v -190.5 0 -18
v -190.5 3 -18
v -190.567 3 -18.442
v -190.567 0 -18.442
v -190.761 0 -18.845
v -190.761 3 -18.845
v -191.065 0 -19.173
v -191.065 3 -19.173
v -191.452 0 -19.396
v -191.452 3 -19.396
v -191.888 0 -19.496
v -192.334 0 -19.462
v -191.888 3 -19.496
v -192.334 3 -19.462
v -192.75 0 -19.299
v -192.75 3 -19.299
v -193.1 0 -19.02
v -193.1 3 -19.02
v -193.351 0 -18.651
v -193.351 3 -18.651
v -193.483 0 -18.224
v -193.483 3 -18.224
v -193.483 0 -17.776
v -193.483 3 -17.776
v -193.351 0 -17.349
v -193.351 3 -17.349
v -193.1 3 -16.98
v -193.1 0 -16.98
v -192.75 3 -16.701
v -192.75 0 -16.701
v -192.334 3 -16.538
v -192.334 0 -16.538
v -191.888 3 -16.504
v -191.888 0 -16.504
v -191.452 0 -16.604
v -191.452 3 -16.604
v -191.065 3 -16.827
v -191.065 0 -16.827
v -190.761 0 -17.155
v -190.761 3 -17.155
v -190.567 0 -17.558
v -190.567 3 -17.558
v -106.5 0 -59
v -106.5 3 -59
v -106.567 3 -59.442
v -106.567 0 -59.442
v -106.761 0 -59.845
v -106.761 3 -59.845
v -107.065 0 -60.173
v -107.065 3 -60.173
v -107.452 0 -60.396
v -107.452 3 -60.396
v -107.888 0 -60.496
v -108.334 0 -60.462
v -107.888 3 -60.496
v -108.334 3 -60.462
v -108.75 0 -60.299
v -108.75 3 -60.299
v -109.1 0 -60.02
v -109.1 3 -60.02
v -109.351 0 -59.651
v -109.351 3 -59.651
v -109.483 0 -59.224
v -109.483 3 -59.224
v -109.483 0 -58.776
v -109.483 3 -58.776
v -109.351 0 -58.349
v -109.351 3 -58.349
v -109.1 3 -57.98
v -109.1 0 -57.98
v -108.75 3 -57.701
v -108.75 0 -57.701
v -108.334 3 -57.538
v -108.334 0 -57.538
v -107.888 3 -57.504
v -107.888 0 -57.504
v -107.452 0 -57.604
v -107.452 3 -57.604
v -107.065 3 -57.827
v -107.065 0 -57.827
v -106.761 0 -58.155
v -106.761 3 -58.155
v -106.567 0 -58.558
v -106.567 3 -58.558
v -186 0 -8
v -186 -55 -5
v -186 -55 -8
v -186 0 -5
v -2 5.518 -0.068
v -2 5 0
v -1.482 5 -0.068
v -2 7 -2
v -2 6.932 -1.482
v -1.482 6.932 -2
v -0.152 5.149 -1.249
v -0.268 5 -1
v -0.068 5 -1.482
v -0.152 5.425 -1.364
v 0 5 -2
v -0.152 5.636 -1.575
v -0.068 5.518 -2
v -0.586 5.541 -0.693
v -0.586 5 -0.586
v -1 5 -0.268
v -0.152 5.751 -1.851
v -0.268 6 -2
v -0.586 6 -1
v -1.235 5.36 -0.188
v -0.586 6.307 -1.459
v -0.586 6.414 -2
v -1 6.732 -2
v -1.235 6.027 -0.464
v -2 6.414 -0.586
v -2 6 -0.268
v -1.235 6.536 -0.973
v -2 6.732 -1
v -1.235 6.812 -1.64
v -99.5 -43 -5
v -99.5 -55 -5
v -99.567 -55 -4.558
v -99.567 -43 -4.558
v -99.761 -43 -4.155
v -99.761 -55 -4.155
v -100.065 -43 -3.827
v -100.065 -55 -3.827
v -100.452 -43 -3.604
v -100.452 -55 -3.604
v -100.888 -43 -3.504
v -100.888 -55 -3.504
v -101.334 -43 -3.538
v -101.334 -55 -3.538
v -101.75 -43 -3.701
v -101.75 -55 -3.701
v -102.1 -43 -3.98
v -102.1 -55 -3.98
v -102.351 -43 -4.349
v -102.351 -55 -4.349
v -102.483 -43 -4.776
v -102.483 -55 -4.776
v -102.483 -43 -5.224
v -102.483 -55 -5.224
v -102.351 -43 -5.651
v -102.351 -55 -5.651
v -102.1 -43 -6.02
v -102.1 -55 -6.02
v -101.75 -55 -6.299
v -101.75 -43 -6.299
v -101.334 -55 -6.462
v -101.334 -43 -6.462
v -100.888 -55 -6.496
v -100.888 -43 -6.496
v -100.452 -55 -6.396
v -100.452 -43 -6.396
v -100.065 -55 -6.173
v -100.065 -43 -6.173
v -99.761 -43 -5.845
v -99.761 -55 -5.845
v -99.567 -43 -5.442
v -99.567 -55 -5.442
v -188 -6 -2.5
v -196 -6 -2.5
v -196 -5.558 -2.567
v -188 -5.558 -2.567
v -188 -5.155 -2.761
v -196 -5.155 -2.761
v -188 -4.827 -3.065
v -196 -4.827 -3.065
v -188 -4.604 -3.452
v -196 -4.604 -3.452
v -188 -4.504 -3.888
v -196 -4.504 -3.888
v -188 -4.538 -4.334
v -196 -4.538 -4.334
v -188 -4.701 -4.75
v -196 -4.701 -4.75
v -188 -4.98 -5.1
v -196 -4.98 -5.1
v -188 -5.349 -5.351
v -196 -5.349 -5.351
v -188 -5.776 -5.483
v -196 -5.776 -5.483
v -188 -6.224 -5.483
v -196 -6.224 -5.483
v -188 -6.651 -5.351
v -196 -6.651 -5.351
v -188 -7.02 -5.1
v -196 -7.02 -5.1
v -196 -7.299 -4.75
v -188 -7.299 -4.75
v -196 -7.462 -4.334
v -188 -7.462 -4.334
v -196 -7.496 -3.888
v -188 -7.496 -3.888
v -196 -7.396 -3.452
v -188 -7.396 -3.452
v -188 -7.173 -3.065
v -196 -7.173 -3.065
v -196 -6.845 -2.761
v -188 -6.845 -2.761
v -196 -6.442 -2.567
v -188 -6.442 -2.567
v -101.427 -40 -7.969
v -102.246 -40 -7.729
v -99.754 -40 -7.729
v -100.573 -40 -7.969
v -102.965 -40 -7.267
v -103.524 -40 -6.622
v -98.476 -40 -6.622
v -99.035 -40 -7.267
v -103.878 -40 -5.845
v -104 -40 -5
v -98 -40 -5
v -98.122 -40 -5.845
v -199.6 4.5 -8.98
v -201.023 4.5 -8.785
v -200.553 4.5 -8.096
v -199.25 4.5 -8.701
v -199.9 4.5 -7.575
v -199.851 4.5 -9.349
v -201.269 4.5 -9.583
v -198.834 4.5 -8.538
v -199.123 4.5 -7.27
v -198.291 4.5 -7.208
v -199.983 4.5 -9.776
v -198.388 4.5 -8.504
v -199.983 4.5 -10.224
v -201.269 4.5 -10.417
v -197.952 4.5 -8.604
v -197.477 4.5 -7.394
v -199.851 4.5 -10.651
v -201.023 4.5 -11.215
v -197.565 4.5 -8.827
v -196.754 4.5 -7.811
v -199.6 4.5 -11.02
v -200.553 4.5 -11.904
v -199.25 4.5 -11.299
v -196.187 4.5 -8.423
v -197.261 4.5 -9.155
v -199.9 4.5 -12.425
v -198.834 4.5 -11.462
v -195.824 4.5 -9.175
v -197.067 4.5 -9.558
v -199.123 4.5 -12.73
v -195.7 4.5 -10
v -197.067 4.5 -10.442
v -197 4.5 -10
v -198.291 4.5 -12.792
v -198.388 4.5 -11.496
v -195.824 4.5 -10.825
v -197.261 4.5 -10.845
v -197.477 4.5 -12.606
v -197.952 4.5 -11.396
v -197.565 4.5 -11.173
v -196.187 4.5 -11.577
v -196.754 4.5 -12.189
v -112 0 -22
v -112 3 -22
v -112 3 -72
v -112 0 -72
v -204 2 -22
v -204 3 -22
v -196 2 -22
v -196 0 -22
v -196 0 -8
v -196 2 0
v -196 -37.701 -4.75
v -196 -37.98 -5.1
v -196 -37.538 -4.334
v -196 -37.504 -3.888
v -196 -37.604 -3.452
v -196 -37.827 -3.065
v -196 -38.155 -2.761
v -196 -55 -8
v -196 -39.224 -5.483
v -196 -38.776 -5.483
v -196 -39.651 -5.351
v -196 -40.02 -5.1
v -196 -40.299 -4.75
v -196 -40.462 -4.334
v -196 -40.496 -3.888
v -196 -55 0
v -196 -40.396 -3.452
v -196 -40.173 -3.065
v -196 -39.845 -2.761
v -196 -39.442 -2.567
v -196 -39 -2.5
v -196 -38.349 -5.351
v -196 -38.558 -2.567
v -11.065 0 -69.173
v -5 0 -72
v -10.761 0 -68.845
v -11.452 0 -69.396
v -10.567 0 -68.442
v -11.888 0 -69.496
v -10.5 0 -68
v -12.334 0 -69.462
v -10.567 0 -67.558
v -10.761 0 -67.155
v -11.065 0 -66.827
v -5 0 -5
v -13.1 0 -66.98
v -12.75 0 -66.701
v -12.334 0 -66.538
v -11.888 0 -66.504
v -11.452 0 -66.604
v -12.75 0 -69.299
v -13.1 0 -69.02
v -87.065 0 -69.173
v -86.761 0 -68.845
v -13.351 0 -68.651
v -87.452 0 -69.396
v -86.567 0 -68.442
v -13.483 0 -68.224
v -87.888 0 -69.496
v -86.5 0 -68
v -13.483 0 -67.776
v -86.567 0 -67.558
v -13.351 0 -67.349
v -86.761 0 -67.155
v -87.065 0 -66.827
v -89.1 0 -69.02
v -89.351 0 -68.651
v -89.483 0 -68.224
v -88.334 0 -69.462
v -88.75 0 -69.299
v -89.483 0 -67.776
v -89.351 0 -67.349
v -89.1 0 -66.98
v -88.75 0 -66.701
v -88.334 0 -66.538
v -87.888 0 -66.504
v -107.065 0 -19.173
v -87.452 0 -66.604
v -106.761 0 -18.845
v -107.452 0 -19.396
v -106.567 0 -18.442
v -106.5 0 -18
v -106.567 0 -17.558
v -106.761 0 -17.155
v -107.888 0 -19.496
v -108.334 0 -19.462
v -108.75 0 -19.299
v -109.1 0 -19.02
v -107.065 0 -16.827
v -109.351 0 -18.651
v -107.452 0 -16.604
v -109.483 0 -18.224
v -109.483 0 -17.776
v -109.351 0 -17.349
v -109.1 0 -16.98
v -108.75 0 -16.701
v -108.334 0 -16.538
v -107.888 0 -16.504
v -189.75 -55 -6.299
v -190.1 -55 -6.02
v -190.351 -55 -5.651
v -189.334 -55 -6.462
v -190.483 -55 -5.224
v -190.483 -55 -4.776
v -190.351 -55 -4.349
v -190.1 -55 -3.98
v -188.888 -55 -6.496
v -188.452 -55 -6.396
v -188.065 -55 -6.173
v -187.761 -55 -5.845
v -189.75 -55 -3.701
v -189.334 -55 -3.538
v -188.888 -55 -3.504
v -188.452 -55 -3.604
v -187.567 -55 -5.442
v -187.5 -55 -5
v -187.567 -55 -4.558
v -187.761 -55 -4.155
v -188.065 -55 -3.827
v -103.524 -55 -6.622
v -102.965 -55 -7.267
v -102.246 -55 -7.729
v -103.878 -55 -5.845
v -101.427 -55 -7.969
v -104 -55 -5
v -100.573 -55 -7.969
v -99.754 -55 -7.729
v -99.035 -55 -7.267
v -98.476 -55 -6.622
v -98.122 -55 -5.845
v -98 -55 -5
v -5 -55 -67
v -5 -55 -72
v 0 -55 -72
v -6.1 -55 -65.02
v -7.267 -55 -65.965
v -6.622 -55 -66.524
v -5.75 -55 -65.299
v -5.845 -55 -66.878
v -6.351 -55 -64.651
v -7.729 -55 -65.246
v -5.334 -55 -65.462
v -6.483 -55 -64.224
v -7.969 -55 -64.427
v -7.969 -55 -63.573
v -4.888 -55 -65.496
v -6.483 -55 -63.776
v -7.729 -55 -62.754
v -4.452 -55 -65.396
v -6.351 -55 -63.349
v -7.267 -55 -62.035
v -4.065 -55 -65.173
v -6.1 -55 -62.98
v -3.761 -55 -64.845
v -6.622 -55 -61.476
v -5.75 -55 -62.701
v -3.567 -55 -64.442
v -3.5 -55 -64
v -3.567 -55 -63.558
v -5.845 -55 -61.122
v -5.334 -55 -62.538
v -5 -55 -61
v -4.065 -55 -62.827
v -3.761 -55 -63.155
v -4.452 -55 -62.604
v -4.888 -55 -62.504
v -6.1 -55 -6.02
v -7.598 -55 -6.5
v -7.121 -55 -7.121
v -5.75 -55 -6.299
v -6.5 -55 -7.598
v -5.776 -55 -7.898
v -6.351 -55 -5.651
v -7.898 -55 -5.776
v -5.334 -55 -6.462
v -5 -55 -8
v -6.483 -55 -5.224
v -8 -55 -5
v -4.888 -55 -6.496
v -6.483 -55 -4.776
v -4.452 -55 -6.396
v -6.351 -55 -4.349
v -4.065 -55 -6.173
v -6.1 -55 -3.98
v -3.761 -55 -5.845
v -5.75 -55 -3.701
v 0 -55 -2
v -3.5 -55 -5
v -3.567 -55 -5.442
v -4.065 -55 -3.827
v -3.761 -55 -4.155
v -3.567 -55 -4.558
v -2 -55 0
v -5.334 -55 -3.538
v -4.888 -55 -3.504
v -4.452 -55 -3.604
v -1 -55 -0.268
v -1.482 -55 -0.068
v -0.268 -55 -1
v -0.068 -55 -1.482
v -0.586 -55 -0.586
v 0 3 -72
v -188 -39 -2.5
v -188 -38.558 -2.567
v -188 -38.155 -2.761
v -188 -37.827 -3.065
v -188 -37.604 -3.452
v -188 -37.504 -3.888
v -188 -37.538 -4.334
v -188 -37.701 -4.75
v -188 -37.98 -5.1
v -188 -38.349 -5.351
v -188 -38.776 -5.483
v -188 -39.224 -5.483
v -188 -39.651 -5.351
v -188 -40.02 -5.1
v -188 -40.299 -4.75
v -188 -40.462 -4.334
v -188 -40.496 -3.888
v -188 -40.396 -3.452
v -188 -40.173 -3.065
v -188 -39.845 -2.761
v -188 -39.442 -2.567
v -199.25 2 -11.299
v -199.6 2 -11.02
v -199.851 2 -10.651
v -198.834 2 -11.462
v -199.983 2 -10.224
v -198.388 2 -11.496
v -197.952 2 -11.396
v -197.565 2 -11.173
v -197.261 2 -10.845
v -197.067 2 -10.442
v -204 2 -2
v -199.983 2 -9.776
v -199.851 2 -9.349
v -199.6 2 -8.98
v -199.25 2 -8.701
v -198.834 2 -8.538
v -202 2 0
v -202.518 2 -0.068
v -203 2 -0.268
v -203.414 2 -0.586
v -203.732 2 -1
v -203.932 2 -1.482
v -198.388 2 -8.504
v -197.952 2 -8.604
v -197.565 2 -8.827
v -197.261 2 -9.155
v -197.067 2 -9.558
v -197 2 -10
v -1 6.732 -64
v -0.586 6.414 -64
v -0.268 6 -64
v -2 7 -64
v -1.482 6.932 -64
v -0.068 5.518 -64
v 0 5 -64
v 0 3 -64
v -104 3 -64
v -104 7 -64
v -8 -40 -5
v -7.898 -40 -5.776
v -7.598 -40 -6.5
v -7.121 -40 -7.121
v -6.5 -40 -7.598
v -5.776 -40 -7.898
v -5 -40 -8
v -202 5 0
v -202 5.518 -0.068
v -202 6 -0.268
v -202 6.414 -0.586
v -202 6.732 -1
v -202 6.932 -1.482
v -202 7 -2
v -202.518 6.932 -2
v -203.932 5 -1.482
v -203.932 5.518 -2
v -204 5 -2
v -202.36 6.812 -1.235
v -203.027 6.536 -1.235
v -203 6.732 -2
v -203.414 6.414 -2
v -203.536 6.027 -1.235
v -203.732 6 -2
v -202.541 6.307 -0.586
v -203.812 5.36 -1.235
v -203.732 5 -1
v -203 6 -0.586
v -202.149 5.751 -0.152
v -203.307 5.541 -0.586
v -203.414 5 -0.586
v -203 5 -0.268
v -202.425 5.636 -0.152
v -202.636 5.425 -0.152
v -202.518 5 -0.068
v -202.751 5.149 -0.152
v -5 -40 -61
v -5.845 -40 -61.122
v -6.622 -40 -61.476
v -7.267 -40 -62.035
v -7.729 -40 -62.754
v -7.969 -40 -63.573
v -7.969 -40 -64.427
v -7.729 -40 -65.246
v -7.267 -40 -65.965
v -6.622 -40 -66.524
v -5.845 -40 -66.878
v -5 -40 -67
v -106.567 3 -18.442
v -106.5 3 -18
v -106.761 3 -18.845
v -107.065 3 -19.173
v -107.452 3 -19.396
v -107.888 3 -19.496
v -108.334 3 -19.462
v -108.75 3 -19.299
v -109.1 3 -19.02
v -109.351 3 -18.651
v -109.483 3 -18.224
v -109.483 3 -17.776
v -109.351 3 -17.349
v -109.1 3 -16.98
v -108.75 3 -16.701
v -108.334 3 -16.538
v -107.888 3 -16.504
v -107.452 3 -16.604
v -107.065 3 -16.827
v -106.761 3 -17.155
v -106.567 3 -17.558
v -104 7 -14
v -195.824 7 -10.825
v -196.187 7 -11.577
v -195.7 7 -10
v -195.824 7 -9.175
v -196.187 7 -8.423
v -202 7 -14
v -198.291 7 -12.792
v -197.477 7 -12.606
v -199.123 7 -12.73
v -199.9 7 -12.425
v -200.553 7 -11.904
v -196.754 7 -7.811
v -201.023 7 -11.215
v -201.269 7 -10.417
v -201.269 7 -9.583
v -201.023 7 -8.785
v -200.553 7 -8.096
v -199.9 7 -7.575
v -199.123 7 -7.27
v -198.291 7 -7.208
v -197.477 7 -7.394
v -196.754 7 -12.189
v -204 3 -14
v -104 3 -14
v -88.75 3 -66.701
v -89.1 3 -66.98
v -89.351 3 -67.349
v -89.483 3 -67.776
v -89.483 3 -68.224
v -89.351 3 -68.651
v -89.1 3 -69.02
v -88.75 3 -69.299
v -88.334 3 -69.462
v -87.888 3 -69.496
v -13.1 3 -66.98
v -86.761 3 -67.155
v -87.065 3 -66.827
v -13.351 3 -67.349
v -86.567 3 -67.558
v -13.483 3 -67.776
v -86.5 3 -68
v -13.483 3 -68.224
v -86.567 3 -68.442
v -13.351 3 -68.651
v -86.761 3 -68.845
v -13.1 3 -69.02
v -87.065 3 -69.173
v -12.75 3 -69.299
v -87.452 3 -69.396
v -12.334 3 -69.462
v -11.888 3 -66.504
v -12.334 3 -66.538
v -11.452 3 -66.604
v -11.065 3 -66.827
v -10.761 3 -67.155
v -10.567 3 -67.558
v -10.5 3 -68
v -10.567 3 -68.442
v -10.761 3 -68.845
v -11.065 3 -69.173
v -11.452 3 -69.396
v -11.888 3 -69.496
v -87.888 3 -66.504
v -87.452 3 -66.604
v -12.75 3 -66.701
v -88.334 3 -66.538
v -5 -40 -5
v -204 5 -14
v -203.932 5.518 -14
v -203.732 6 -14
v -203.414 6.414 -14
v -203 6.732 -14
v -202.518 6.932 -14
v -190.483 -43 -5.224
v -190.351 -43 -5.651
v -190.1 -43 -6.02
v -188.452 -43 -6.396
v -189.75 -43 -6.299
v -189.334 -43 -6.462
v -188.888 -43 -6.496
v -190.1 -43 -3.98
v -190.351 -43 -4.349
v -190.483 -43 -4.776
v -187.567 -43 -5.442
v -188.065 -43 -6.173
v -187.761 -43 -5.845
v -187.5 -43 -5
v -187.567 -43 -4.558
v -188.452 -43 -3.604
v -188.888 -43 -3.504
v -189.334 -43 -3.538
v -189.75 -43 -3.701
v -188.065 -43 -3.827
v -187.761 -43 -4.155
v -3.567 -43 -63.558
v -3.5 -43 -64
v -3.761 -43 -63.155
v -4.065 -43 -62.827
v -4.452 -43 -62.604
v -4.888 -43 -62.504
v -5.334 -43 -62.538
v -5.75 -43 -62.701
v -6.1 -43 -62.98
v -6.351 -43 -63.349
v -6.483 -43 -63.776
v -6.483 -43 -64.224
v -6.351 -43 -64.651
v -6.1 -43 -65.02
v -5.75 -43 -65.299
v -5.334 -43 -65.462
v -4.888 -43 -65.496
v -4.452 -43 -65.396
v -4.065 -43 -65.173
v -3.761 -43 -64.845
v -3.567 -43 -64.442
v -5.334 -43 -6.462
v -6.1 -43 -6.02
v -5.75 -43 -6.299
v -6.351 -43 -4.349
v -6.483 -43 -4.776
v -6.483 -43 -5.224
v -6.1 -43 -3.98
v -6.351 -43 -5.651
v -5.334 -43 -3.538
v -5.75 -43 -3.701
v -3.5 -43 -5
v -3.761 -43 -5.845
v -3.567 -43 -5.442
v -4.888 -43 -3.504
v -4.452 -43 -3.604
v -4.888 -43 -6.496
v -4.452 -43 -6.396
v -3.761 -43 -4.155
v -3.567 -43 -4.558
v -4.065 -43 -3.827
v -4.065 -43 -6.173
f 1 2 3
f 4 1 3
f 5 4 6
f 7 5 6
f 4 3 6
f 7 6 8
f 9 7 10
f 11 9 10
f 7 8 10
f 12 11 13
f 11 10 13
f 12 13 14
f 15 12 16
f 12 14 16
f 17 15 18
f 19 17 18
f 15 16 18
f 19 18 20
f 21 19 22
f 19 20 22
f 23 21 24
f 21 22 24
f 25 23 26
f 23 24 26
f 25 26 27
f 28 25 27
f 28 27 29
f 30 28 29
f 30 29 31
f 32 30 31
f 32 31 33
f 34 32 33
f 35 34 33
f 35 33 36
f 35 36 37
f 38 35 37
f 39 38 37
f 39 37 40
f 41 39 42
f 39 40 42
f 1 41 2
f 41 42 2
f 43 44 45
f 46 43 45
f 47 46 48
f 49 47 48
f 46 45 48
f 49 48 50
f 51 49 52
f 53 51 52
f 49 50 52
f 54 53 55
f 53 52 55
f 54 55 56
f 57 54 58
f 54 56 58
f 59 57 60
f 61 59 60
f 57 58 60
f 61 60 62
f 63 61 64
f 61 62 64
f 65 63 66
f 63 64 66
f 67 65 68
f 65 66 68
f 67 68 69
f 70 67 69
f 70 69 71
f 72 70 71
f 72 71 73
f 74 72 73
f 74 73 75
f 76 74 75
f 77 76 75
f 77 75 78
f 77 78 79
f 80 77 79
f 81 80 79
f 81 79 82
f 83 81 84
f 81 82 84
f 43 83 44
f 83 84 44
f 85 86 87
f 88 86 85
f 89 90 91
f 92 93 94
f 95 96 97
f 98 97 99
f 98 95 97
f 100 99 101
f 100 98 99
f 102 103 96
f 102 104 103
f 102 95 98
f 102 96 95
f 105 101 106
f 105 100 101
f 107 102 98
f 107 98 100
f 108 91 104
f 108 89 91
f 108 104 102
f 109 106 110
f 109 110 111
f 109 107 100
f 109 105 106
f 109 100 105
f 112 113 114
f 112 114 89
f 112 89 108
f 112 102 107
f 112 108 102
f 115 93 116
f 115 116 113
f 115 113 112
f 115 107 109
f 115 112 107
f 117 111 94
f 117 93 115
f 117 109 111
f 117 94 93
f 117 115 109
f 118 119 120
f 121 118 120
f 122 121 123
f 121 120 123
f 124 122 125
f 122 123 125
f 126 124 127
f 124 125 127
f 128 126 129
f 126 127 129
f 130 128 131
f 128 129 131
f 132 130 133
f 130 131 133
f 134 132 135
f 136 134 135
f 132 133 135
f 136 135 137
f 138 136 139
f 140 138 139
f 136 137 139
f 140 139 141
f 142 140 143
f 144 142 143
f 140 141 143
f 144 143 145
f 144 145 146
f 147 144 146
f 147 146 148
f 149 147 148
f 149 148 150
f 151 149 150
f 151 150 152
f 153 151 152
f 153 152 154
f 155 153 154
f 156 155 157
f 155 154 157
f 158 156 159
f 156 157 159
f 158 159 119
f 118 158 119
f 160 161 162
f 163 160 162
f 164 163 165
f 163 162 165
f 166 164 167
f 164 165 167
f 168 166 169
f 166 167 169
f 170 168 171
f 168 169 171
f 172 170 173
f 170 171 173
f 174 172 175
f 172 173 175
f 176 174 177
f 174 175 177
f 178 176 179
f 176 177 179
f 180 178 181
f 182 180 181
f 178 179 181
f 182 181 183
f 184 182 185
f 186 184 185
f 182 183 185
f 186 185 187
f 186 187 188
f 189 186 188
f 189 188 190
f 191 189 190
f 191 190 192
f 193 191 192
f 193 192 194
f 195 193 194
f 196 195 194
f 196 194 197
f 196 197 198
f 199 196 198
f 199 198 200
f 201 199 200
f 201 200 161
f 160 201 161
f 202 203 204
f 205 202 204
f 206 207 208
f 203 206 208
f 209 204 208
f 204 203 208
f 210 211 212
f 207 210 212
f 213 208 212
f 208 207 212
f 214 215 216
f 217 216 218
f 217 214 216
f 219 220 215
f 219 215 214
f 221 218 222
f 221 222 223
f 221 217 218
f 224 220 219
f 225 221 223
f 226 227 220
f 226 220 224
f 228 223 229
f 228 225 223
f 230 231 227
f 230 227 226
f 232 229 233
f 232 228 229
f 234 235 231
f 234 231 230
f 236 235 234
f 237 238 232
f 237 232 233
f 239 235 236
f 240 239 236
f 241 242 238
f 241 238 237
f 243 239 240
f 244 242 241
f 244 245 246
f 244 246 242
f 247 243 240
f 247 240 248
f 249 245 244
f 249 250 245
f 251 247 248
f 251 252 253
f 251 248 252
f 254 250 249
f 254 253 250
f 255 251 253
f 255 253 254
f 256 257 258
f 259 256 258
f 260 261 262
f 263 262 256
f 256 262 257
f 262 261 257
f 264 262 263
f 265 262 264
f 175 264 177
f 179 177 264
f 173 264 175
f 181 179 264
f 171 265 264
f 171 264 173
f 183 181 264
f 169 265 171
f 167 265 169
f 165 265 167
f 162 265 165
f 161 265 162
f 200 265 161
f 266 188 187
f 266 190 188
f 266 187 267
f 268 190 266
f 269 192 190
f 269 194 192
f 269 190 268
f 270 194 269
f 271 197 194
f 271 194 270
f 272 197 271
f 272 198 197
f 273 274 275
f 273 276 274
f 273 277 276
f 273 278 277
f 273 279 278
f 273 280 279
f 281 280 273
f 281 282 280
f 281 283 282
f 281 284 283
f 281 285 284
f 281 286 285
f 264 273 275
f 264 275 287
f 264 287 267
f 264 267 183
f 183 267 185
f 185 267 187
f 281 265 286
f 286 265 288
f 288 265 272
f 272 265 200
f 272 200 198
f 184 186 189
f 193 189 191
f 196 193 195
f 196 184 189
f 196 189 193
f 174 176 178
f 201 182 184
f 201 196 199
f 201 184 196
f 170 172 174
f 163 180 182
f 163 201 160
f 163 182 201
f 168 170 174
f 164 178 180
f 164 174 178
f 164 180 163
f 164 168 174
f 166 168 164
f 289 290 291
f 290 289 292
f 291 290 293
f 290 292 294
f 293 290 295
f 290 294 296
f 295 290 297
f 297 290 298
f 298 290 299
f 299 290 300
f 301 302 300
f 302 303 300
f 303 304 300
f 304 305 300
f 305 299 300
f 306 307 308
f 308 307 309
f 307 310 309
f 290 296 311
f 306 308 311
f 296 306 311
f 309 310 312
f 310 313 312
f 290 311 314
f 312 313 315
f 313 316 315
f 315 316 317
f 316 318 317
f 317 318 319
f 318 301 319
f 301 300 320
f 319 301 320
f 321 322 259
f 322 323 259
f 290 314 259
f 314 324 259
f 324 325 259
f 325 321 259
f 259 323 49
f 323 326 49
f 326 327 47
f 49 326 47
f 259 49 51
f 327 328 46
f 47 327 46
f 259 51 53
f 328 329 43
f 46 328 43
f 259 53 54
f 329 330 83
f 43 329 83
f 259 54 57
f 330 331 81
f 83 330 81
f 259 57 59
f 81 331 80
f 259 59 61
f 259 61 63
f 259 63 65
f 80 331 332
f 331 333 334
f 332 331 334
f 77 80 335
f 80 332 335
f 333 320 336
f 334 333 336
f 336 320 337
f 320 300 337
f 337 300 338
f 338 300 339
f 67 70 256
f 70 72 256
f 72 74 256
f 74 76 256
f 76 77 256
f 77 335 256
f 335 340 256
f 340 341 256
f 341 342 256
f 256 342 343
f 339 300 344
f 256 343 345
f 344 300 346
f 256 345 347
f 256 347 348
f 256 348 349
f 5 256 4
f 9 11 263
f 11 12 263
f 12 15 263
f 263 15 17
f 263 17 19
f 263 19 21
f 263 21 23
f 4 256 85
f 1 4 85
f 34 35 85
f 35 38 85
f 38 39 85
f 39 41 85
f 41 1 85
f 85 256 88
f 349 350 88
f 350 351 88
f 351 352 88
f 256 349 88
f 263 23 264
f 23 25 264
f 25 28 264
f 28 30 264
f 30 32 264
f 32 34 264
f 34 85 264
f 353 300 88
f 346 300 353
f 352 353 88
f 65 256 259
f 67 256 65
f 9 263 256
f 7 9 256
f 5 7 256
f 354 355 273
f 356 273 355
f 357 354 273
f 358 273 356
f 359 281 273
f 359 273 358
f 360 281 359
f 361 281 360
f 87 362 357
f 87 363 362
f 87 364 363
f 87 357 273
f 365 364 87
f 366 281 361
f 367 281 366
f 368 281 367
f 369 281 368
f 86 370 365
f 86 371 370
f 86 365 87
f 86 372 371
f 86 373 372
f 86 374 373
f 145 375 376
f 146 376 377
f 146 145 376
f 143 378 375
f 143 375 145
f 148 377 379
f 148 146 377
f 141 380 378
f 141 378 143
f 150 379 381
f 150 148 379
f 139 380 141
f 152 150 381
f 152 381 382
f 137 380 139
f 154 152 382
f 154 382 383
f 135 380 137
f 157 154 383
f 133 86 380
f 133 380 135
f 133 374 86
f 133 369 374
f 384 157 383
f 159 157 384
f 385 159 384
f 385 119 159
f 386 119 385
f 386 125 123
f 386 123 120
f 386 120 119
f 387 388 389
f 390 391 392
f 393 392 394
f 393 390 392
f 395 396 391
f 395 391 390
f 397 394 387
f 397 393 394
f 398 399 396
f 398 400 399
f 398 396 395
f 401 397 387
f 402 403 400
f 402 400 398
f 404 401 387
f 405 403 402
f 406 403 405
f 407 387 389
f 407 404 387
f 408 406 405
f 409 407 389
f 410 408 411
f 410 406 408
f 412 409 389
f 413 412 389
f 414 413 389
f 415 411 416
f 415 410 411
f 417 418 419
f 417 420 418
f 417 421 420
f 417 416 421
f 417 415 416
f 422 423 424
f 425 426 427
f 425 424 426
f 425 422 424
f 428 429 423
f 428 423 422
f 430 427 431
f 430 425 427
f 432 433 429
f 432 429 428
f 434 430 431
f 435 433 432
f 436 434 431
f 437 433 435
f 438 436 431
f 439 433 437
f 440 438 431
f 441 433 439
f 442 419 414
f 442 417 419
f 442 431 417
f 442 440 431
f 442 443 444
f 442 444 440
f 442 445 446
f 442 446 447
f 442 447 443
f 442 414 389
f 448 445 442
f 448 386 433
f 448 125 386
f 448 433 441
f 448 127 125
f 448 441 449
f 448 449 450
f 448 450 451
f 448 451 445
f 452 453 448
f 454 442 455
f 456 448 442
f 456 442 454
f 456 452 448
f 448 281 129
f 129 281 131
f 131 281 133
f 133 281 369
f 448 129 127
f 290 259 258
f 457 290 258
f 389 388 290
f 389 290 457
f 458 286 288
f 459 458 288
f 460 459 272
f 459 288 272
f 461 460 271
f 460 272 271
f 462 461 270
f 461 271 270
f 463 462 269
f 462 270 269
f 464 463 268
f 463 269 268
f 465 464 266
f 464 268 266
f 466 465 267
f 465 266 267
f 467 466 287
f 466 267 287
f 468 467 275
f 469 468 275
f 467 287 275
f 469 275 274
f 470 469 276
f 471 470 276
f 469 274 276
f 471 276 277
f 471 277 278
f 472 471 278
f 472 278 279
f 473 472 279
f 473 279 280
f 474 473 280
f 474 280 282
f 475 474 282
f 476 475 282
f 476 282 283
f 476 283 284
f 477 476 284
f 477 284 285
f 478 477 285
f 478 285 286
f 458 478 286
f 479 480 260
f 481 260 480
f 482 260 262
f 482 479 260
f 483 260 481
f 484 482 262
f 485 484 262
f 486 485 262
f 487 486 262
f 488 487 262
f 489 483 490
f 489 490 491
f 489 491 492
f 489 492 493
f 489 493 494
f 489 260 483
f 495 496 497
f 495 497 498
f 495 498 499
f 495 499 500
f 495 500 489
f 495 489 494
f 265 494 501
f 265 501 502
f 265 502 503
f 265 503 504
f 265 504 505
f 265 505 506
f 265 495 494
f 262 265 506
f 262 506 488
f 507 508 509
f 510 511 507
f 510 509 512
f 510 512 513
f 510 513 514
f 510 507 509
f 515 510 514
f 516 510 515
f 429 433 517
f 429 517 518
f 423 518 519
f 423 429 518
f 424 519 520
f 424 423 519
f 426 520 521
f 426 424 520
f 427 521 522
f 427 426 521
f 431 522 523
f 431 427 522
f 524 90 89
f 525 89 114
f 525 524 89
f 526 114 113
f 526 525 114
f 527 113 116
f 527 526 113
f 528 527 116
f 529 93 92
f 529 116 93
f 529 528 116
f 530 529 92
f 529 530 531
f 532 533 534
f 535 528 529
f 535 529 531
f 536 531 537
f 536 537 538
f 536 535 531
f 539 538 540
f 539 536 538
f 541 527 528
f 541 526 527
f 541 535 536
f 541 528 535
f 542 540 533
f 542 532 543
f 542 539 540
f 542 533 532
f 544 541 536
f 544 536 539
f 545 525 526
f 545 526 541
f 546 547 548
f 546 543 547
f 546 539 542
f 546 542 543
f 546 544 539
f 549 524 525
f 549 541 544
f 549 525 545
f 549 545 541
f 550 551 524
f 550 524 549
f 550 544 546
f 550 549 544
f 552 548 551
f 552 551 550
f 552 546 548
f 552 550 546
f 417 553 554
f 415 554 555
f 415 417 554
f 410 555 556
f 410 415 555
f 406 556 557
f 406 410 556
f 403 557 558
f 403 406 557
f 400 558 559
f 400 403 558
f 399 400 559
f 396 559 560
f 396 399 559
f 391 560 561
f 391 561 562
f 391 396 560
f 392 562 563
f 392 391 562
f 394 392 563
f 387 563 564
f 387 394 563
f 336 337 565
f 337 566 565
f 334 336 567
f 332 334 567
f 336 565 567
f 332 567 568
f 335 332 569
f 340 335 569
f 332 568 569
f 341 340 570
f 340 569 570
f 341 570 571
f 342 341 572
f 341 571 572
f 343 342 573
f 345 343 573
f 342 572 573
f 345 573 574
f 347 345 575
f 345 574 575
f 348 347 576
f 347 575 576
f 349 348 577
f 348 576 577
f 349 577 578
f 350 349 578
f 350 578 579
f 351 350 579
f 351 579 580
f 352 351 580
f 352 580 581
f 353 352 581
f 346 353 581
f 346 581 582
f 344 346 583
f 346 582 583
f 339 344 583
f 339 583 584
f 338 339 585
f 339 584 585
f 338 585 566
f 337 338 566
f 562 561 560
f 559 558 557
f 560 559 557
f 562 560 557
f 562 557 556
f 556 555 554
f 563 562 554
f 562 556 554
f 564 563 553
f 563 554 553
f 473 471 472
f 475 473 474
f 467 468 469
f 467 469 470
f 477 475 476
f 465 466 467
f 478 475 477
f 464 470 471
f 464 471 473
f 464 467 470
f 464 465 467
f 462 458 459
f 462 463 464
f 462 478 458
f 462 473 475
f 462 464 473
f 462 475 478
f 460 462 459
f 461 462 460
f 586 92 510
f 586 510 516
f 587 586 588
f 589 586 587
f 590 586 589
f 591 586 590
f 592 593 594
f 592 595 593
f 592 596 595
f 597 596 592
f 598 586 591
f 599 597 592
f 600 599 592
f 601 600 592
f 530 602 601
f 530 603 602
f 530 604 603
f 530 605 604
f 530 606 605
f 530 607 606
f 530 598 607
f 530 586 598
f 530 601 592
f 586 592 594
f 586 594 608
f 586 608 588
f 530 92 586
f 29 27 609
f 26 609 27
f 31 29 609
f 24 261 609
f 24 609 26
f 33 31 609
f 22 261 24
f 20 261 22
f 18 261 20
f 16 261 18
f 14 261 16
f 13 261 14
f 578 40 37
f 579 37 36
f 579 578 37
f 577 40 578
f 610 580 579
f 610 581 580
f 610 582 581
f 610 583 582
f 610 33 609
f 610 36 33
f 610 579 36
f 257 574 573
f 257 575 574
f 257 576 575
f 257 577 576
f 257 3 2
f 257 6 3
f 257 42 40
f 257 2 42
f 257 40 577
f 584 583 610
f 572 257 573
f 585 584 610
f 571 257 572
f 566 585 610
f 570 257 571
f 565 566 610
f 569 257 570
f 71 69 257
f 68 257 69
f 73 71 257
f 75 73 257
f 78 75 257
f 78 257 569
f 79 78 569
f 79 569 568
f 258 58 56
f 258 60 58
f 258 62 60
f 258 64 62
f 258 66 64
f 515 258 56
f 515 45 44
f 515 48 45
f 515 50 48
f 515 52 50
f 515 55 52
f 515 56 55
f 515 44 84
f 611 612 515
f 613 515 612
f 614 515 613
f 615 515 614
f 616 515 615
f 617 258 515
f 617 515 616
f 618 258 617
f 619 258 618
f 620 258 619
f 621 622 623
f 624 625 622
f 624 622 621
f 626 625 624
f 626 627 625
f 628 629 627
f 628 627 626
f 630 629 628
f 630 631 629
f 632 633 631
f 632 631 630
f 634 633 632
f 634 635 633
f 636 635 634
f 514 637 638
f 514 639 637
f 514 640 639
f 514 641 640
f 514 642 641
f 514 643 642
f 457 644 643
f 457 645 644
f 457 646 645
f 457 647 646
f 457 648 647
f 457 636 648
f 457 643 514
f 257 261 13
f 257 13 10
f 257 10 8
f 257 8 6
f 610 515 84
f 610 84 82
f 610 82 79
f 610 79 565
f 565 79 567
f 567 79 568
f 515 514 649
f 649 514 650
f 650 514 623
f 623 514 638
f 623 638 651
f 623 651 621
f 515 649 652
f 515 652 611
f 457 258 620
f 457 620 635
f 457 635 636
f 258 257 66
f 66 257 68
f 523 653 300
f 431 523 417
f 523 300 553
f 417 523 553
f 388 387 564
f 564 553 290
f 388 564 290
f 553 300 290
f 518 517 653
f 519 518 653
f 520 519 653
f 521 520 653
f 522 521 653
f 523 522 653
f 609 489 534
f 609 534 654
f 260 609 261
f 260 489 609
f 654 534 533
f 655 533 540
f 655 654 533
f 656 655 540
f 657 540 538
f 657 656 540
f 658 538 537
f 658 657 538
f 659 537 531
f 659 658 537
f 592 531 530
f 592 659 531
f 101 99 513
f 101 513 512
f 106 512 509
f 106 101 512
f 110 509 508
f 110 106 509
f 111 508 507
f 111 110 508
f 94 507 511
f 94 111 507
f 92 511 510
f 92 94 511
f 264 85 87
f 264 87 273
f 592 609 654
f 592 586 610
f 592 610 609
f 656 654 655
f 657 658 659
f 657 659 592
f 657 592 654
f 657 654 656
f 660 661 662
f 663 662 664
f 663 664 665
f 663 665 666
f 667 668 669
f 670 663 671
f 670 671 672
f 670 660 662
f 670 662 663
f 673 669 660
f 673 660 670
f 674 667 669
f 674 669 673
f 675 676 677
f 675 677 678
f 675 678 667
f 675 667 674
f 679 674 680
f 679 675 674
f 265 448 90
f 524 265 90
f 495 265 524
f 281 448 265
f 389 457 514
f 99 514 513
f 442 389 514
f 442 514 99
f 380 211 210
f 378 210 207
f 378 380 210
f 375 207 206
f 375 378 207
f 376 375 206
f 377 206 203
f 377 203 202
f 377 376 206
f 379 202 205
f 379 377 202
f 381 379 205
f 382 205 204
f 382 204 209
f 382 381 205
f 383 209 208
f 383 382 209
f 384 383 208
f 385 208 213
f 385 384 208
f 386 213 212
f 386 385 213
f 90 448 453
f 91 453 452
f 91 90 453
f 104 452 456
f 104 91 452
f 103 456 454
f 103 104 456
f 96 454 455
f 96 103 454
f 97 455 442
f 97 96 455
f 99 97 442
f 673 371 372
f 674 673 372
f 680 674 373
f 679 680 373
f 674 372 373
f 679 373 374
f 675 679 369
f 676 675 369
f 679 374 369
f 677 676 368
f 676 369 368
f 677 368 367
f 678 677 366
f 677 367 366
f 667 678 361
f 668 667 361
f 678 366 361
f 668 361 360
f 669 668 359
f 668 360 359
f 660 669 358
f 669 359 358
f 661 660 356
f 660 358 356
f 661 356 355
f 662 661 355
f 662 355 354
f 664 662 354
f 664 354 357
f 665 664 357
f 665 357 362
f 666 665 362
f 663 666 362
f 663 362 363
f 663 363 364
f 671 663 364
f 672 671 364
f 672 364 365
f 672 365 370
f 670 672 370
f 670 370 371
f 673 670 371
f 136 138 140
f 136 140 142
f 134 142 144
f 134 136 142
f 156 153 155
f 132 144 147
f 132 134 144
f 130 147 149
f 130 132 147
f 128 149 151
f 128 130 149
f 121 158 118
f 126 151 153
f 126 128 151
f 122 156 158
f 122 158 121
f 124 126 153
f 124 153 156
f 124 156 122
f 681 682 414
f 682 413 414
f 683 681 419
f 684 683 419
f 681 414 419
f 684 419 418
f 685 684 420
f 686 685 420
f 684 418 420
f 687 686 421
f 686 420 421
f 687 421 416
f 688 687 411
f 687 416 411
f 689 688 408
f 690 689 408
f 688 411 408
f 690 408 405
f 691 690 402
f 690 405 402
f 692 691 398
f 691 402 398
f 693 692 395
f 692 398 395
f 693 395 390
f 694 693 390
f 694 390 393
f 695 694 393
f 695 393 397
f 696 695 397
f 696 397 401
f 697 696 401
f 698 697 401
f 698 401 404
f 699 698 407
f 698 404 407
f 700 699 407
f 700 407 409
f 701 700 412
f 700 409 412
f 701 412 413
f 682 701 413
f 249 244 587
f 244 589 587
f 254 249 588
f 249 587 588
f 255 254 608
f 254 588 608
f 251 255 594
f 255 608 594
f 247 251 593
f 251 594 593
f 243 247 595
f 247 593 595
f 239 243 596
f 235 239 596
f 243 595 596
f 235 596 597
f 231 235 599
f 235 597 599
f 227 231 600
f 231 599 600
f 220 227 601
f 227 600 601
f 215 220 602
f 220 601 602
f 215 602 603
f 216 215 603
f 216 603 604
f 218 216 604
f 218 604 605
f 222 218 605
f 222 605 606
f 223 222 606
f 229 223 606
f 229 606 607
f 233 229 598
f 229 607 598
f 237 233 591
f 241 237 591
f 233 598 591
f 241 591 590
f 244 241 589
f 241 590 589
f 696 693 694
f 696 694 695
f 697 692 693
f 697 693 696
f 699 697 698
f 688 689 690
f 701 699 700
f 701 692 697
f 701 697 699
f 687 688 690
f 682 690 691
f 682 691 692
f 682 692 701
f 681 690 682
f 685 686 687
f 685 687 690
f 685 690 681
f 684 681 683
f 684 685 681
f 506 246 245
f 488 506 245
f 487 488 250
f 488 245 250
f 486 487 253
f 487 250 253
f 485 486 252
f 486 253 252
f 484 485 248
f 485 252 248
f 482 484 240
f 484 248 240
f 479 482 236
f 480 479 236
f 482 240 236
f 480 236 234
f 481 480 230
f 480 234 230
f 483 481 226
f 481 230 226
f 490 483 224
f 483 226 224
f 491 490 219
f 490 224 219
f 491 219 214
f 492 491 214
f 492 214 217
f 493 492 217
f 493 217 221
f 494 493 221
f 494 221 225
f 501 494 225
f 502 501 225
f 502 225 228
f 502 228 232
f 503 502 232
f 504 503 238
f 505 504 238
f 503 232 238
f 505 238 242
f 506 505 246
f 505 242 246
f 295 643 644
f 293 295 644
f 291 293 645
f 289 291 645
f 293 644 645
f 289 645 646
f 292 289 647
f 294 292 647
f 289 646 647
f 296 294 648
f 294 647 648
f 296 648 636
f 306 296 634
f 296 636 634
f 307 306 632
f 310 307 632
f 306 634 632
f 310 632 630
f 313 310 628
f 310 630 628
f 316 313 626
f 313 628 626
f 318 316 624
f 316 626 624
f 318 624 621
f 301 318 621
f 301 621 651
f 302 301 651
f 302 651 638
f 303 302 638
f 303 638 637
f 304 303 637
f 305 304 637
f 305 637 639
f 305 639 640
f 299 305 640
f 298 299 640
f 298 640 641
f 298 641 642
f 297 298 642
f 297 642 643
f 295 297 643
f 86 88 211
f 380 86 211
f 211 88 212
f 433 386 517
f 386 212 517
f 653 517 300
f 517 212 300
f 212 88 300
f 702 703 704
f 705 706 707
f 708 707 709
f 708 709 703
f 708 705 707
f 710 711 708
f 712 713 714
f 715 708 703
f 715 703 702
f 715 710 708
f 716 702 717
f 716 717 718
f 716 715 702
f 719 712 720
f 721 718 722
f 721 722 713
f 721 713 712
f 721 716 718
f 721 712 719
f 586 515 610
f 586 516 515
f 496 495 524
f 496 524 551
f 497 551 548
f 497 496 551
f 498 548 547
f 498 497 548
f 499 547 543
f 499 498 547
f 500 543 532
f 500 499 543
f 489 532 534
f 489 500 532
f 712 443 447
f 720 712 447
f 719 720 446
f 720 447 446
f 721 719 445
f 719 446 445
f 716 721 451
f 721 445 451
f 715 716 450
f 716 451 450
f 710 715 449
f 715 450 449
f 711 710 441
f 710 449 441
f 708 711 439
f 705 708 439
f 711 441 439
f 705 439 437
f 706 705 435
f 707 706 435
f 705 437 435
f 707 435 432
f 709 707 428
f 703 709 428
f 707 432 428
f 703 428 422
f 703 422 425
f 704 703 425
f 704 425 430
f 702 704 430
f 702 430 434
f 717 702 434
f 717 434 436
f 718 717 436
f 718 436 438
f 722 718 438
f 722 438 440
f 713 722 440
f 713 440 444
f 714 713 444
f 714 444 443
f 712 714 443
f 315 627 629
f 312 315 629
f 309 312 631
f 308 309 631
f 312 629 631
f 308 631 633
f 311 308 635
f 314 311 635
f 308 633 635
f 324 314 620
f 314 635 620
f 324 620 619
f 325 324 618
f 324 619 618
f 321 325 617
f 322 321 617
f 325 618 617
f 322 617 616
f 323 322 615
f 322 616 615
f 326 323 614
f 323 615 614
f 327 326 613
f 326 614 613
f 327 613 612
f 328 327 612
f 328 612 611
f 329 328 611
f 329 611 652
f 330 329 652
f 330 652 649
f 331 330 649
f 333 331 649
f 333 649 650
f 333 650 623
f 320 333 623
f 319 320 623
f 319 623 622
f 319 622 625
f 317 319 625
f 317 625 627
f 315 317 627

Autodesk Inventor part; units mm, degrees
ref_plane "YZ Plane" through (0, 0, 0) normal (1, 0, 0) x (0, 1, 0)
ref_plane "XZ Plane" through (0, 0, 0) normal (0, 1, 0) x (-1, 0, 0)
ref_plane "XY Plane" through (0, 0, 0) normal (0, 0, 1) x (1, 0, 0)
sketch "スケッチ1" plane through (0, 0, 0) normal (0, 1, 0) x (-1, 0, 0)
  line L0 (0, 0) -> (204, 0)
  line L1 (204, 0) -> (204, -72)
  line L2 (204, -72) -> (0, -72)
  line L3 (0, -72) -> (0, 0)
  dimension "d0" = 204
  dimension "d1" = 72
extrude "押し出し1" add sketch "スケッチ1" along normal blind 7
sketch "スケッチ2" plane through (0, 7, 0) normal (0, 1, 0) x (1, 0, 0)
  line L0 (-204, 22) -> (-112, 22)
  line L1 (-112, 22) -> (-112, 72)
  line L2 (-112, 72) -> (-204, 72)
  line L3 (-204, 72) -> (-204, 22)
  line L4 (-204, 72) -> (-204, 0) projected
  line L5 (0, 72) -> (-204, 72) projected
  line L6 (-204, 0) -> (0, 0) projected
  dimension "d5" = 92
  dimension "d76" = 50
extrude "押し出し2" cut sketch "スケッチ2" against normal through all
sketch "スケッチ3" plane through (0, 7, 0) normal (0, 1, 0) x (1, 0, 0)
  line L0 (-204, 22) -> (-204, 0) projected
  line L1 (-204, 22) -> (-112, 22)
  line L2 (-112, 22) -> (-112, 14)
  line L3 (-112, 14) -> (-204, 14)
  line L4 (-204, 14) -> (-204, 22)
  line L5 (-112, 72) -> (-112, 22) projected
  line L6 (-112, 72) -> (-104, 72)
  line L7 (-104, 72) -> (-104, 14)
  line L8 (-104, 14) -> (-112, 14)
  line L9 (-112, 14) -> (-112, 72)
  line L10 (0, 72) -> (-112, 72) projected
  line L11 (0, 0) -> (0, 72) projected
  line L12 (-112, 72) -> (0, 72)
  line L13 (0, 72) -> (0, 64)
  line L14 (0, 64) -> (-112, 64)
  line L15 (-112, 64) -> (-112, 72)
  point P0 (-204, 14)
  point P1 (-104, 64)
  dimension "d8" = 8
  dimension "d9" = 8
  dimension "d19" = 8
extrude "押し出し3" cut sketch "スケッチ3" against normal blind 4
sketch "スケッチ4" plane through (0, 3, 0) normal (0, 1, 0) x (1, 0, 0)
  circle A0 centre (-192, 18) radius 1.5
  circle A1 centre (-108, 18) radius 1.5
  circle A2 centre (-108, 59) radius 1.5
  line L0 (-112, 72) -> (0, 72) projected
  line L1 (-204, 14) -> (-204, 22) projected
  line L2 (-112, 22) -> (-112, 72) projected
  circle A3 centre (-88, 68) radius 1.5
  circle A4 centre (-12, 68) radius 1.5
  line L3 (0, 72) -> (0, 64) projected
  point P0 (0, 0)
  point P1 (-204, 18)
  point P2 (-204, 18)
  dimension "d12" = 3
  dimension "d13" = 3
  dimension "d14" = 3
  dimension "d16" = 12
  dimension "d20" = 4
  dimension "d21" = 3
  dimension "d22" = 3
  dimension "d23" = 4
  dimension "d24" = 24
  dimension "d25" = 12
  dimension "d32" = 41
  dimension "d34" = 76
extrude "押し出し4" cut sketch "スケッチ4" against normal through all
sketch "スケッチ5" plane through (0, 0, 0) normal (0, -1, 0) x (1, 0, 0)
  line L0 (-204, 0) -> (0, 0) projected
  line L1 (-204, -22) -> (-112, -22) projected
  line L2 (-204, 0) -> (-196, 0)
  line L3 (-196, 0) -> (-196, -22)
  line L4 (-196, -22) -> (-204, -22)
  line L5 (-204, -22) -> (-204, 0)
  dimension "d26" = 8
extrude "押し出し5" cut sketch "スケッチ5" against normal blind 2
sketch "スケッチ6" plane through (0, 0, 0) normal (0, -1, 0) x (1, 0, 0)
  line L0 (-196, 0) -> (-196, -22) projected
  line L1 (0, 0) -> (-196, 0)
  line L2 (-196, 0) -> (-196, -5)
  line L3 (-196, -5) -> (0, -5)
  line L4 (0, -5) -> (0, 0)
  line L5 (-196, 0) -> (0, 0) projected
  line L6 (-112, -72) -> (0, -72) projected
  line L7 (0, 0) -> (-5, 0)
  line L8 (-5, 0) -> (-5, -72)
  line L9 (-5, -72) -> (0, -72)
  line L10 (0, -72) -> (0, 0)
  point P0 (0, -72)
  point P1 (-5, -5)
  dimension "d29" = 5
  dimension "d33" = 5
extrude "押し出し6" add sketch "スケッチ6" along normal blind 55
fillet "フィレット1" radius 2 4 edges at (-102, 7, 0) (0, 7, -32) (0, -24, 0) (-204, 7, -7)
sketch "スケッチ7" plane through (-5, 0, -5) normal (0, 0, -1) x (-1, 0, 0)
  line L0 (191, 2) -> (191, -55) projected
  line L1 (0, 0) -> (191, 0) projected
  line L2 (191, -55) -> (181, -55)
  line L3 (181, -55) -> (181, 0)
  line L4 (181, 0) -> (191, 0)
  line L5 (191, 0) -> (191, -55)
  point P0 (-5, 0)
  dimension "d36" = 10
extrude "押し出し7" add sketch "スケッチ7" along normal blind 3
sketch "スケッチ8" plane through (-196, 2, -22) normal (-1, 0, 0) x (0, 0, 1)
  circle A0 centre (18, -41) radius 1.5
  circle A1 centre (18, -8) radius 1.5
  line L0 (22, -57) -> (14, -57) projected
  line L1 (0, 0) -> (22, 0) projected
  point P0 (22, -2)
  point P1 (18, -57)
  point P2 (18, -57)
  dimension "d39" = 3
  dimension "d40" = 3
  dimension "d41" = 16
  dimension "d62" = 8
extrude "押し出し8" cut sketch "スケッチ8" against normal blind 8
sketch "スケッチ9" plane through (0, -55, 0) normal (0, -1, 0) x (1, 0, 0)
  line L0 (-5, -5) -> (-5, -72) projected
  circle A0 centre (-5, -5) radius 3
  circle A1 centre (-5, -64) radius 3
  line L1 (-186, -5) -> (-5, -5) projected
  circle A2 centre (-101, -5) radius 3
  circle A3 centre (-191, -5) radius 3
  line L2 (-5, -72) -> (0, -72) projected
  point P0 (0, 0)
  dimension "d45" = 6
  dimension "d46" = 6
  dimension "d47" = 6
  dimension "d48" = 96
  dimension "d49" = 6
  dimension "d50" = 90
  dimension "d78" = 8
extrude "押し出し9" add sketch "スケッチ9" against normal blind 15 contours L1 A0 L0 | L0 A0 L1 | A1 L0 | L0 A1 | A2 L1 | L1 A2
sketch "スケッチ10" plane through (0, -55, 0) normal (0, -1, 0) x (1, 0, 0)
  line L0 (-5, -5) -> (-186, -5) projected
  circle A0 centre (-5, -5) radius 1.5
  line L1 (-98, -5) -> (-104, -5) projected
  circle A1 centre (-101, -5) radius 1.5
  arc A2 (-5, -61) -> (-5, -67) centre (-5, -64) ccw projected
  circle A3 centre (-5, -64) radius 1.5
  circle A4 centre (-189, -5) radius 1.5
  line L2 (-186, -8) -> (-196, -8) projected
  line L3 (-186, -5) -> (-186, -8) projected
  point P0 (0, 0)
  dimension "d54" = 3
  dimension "d55" = 3
  dimension "d56" = 3
  dimension "d57" = 3
  dimension "d58" = 3
  dimension "d59" = 3
extrude "押し出し10" cut sketch "スケッチ10" against normal blind 12
sketch "スケッチ11" plane through (0, 7, 0) normal (0, 1, 0) x (1, 0, 0)
  circle A0 centre (-198.5, 10) radius 2.8
  line L0 (-204, 14) -> (-204, 0) projected
  line L1 (-204, 0) -> (-2, 0) projected
  line L2 (-104, 14) -> (-202, 14) projected
  line L3 (-202, 2) -> (-202, 14) projected
  point P0 (0, 0)
  dimension "d63" = 5.6
  dimension "d65" = 5.5
  dimension "d77" = 4
  dimension "d79" = 10
extrude "押し出し11" cut sketch "スケッチ11" against normal blind 2.5
sketch "スケッチ12" plane through (-198.5, 4.5, -10) normal (0, 1, 0) x (1, 0, 0)
  line L0 (2.5, -10) -> (2.5, 12) projected
  circle A0 centre (0, 0) radius 1.5
  circle A1 centre (0, 0) radius 2.8 projected
  point P0 (198.5, -10)
  dimension "d71" = 3
extrude "押し出し12" cut sketch "スケッチ12" against normal through all contours A0
fillet "フィレット2" radius 2 2 edges at (-203.4142, 6.4142, -0.5858) (-204, 3.5, 0)
properties part number "オンゲキボタン_top1_3D プリント"
